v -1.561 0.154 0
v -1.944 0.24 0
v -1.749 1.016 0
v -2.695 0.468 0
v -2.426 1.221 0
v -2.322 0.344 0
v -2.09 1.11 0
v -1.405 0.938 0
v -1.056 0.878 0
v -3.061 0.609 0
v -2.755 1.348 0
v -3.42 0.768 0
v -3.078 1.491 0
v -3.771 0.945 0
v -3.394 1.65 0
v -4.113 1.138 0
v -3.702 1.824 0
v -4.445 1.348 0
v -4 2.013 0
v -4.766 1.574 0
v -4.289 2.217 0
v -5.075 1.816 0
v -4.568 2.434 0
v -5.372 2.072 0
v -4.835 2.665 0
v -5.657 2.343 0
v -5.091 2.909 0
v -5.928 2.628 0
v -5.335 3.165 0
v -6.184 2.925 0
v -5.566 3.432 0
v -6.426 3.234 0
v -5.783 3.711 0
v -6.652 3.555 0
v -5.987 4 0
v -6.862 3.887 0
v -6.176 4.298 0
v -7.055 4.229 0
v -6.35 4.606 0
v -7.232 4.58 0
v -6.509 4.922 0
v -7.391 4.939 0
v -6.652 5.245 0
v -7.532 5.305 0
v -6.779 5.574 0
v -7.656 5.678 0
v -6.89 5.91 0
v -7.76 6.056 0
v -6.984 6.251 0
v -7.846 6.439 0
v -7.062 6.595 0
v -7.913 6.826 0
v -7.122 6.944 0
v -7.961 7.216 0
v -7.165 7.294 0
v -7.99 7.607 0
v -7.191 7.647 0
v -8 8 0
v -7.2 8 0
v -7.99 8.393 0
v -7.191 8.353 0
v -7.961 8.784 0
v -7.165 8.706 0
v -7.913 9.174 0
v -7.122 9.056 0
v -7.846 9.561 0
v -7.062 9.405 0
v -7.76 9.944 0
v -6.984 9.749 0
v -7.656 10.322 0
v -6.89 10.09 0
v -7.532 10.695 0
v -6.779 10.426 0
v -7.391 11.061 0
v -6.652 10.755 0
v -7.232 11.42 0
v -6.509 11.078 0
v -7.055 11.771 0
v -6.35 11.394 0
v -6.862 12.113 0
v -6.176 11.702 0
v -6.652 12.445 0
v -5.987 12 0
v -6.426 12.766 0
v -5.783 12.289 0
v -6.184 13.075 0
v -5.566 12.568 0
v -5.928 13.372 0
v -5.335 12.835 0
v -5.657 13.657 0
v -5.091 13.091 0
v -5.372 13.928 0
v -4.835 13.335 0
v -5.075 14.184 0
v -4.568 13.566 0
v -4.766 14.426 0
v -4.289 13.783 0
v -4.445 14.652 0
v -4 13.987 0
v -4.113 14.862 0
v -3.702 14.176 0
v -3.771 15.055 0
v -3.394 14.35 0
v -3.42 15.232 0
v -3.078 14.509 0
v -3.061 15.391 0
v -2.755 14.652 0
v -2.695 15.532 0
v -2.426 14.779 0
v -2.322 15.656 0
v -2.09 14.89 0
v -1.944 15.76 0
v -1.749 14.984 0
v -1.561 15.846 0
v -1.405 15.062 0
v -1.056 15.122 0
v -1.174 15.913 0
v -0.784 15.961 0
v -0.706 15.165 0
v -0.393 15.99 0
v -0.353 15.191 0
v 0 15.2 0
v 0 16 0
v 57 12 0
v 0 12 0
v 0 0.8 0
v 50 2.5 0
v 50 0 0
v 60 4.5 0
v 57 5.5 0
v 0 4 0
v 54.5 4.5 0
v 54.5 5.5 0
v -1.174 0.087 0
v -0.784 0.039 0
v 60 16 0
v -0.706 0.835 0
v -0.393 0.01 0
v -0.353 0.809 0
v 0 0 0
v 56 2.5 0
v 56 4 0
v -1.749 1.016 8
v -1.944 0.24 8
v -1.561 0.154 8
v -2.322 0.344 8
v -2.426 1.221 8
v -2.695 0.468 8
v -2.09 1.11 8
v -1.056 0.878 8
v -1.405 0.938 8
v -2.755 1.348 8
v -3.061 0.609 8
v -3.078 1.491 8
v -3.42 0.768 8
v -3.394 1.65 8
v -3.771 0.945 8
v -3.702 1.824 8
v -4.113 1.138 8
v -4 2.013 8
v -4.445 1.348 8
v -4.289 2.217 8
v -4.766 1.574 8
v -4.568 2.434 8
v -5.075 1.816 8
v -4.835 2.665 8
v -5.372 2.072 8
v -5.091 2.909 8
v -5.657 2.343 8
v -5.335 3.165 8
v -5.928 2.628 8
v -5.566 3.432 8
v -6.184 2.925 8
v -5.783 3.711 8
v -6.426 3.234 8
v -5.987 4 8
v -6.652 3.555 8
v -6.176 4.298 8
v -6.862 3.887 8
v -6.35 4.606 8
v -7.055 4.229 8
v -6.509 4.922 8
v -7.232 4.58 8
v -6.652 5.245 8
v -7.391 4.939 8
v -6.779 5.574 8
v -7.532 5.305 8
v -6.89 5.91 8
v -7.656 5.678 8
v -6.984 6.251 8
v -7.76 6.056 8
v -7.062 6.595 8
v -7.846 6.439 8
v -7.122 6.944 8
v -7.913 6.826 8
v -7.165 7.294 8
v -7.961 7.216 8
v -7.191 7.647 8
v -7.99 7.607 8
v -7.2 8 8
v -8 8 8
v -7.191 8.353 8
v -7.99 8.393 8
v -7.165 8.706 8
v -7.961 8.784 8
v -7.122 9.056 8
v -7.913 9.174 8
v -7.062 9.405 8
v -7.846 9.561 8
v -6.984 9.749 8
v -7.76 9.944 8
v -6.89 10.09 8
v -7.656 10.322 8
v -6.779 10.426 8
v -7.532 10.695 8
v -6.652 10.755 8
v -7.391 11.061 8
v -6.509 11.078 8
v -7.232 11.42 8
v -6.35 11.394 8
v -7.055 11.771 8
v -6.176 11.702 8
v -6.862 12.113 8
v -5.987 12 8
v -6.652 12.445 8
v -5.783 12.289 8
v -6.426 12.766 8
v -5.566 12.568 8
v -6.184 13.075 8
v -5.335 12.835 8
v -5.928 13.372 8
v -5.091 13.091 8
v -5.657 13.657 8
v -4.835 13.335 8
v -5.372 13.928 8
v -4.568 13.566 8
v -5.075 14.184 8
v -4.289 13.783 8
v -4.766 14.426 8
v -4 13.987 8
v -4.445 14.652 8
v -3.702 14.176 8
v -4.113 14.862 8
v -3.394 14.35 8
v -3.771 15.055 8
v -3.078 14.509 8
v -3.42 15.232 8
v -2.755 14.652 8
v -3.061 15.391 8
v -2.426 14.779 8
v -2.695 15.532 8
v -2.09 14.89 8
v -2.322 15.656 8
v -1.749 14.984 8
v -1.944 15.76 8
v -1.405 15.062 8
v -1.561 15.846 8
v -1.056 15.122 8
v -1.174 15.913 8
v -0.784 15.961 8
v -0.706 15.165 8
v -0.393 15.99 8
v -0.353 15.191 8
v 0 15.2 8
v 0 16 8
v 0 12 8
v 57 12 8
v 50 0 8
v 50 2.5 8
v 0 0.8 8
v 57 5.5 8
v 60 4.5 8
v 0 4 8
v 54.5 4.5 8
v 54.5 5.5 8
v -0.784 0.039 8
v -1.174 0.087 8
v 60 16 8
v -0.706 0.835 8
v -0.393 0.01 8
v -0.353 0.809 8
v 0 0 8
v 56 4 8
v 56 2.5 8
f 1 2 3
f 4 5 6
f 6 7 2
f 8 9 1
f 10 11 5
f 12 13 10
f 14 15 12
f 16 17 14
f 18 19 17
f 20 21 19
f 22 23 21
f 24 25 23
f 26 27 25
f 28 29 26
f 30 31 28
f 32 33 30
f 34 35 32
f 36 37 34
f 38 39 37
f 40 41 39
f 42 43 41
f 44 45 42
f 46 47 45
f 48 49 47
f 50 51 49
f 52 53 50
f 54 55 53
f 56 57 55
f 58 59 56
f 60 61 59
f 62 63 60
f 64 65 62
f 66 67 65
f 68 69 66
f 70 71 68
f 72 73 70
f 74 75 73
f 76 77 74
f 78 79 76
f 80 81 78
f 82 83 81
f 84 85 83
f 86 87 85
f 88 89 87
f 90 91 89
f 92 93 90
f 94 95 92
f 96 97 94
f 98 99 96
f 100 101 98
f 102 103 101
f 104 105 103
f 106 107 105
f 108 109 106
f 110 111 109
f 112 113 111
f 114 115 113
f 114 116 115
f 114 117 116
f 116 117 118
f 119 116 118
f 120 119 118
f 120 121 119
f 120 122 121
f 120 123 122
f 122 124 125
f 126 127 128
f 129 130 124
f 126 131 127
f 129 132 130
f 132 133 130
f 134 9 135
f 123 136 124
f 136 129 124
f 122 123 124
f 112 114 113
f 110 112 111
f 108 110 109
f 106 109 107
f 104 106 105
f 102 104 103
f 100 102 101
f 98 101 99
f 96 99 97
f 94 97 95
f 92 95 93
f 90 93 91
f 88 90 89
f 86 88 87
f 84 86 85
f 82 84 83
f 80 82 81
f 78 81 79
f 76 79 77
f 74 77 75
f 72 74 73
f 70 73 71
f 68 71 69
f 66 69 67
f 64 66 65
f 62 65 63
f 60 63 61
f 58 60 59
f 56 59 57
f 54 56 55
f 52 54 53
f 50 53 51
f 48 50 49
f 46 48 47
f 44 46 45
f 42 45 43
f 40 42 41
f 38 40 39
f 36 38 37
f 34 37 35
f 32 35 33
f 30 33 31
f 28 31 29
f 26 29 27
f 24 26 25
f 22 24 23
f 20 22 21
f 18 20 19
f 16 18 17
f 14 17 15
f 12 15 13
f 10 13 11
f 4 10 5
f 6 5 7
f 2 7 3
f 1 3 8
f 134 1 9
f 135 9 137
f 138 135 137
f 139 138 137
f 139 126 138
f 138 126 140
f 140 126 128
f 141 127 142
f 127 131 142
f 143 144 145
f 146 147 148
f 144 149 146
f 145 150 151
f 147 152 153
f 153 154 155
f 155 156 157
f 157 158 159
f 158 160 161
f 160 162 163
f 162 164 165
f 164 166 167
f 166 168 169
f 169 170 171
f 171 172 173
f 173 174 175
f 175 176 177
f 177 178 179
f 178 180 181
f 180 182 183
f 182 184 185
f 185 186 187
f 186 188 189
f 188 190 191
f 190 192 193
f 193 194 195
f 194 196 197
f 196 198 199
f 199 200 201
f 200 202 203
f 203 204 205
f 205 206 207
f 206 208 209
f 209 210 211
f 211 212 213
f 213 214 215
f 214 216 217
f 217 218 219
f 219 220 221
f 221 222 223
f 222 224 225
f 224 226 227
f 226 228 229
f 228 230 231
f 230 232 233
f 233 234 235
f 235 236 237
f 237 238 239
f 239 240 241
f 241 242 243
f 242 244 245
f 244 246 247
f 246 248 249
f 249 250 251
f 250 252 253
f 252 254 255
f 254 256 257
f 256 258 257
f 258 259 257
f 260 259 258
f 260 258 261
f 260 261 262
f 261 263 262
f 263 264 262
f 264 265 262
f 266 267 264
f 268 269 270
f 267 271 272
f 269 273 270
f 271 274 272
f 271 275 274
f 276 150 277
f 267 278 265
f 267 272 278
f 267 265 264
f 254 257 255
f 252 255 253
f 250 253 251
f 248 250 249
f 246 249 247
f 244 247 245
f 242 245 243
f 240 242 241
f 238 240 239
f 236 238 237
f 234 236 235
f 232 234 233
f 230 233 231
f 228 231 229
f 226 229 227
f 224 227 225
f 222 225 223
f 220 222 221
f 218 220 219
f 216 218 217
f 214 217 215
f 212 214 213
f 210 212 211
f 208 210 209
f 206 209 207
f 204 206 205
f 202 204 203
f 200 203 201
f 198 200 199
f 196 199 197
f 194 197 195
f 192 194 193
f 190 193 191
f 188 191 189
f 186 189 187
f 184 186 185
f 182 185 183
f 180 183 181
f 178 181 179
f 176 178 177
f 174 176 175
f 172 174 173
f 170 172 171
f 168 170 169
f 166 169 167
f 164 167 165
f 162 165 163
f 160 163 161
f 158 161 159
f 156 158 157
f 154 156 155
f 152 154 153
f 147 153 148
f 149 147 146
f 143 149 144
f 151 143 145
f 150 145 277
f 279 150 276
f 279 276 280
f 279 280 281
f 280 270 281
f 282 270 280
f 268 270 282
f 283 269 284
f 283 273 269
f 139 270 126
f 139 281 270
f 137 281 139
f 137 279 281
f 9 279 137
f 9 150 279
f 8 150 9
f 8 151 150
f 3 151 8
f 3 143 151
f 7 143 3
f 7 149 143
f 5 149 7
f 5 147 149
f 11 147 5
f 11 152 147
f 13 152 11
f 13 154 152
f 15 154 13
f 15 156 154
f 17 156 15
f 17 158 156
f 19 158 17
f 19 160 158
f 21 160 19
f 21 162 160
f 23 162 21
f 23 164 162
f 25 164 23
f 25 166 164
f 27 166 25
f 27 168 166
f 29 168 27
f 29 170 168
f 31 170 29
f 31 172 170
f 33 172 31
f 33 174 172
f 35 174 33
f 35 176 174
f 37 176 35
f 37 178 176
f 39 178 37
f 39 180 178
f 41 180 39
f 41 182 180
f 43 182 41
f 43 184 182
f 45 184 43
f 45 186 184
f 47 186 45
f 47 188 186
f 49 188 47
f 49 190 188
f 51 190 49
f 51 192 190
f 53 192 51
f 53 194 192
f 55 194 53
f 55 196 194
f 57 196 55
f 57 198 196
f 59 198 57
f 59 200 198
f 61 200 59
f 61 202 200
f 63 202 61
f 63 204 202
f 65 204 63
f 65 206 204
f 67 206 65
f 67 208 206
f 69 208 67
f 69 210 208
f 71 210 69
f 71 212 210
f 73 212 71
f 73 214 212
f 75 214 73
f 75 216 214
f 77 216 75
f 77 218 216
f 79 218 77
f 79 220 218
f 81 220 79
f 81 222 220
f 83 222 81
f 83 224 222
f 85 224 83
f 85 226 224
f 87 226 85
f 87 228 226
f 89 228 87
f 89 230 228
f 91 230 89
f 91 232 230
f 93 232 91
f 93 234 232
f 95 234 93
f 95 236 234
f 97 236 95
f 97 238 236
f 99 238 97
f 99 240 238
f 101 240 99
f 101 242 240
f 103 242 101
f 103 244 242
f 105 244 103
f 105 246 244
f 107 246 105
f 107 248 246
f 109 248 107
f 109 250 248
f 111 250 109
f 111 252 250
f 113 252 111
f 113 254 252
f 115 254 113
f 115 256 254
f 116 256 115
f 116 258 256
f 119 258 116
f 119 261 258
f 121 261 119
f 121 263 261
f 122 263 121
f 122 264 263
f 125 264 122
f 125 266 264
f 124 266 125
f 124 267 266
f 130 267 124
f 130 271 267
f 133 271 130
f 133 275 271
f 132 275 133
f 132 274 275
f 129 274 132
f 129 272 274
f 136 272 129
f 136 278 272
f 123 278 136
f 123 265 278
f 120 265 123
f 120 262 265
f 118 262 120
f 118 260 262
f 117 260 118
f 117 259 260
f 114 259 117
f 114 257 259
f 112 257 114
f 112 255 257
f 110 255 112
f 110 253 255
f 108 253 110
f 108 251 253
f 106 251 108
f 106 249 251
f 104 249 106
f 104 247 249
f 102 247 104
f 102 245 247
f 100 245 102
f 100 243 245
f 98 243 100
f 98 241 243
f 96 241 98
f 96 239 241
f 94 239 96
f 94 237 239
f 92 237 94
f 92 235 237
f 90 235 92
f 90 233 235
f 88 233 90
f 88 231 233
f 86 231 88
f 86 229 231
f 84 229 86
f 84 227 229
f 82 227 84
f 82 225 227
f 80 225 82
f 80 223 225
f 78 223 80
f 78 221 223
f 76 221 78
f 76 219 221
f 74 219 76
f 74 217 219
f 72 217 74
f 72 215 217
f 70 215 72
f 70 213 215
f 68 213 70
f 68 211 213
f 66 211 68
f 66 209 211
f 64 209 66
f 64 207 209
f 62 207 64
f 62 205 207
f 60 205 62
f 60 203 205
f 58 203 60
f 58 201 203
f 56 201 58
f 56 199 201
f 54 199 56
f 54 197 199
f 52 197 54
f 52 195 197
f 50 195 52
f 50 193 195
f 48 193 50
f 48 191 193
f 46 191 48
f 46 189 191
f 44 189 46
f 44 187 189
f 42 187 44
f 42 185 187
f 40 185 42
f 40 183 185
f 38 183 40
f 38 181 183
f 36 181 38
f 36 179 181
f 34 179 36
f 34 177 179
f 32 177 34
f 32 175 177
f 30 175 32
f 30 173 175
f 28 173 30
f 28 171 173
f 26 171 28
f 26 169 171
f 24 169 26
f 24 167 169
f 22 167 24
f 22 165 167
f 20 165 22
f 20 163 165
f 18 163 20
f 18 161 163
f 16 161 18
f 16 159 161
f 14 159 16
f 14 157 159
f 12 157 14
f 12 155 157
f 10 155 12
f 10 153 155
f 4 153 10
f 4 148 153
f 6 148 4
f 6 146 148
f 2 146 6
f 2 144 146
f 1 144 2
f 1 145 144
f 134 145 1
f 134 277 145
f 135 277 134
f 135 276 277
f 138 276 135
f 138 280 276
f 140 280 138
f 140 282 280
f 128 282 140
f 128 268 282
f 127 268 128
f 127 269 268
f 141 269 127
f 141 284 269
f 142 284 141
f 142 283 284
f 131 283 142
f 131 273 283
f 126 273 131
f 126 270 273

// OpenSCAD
// KNOWN-WRONG PART (must fail): the pinch ridges are missing
// Pinch clamp for silicone tubing (up to 6.4 mm OD) with a living hinge and a snap latch
// Category: quick fixes. One flat profile: two jaws joined by a 0.8 mm half-ring hinge, a
// half-round pinch ridge on each jaw, and a hook on the upper jaw whose nose snaps under the
// lower jaw's thin tongue when the jaws are squeezed together.
// Print: PETG or PP (PLA hinges crack), lying flat, 0.2 mm layers, 100 % infill.
// SPDX-License-Identifier: CERN-OHL-P-2.0

/* [Clamp] */
thickness = 8;            // extrusion along Z
lower_jaw = [50, 4];      // x 0..50, y 0..4
tongue = [50, 56, 2.5];   // x from, x to, y bottom (top at y = 4)
upper_jaw = [60, 12, 16]; // x 0..60, y 12..16
hinge_c = [0, 8];         // half-ring on the x < 0 side
hinge_r = [7.2, 8];       // inner, outer radius (0.8 mm thick)
ridge_x = 27.5;
ridge_r = 1.5;
leg = [57, 60, 4.5, 12];  // hook leg x from, x to, y from, y to
nose = [54.5, 57, 4.5, 5.5];

/* [Hidden] */
eps = 0.01;

linear_extrude(thickness) union() {
    square(lower_jaw);
    translate([tongue[0], tongue[2]]) square([tongue[1] - tongue[0], lower_jaw.y - tongue[2]]);
    translate([0, upper_jaw[1]]) square([upper_jaw[0], upper_jaw[2] - upper_jaw[1]]);
    intersection() {
        translate(hinge_c) difference() { circle(r = hinge_r[1], $fn = 128); circle(r = hinge_r[0], $fn = 128); }
        translate([-hinge_r[1] - 1, -1]) square([hinge_r[1] + 1 + eps, 2 * hinge_r[1] + 2]);
    }
    translate([leg[0], leg[2]]) square([leg[1] - leg[0], leg[3] - leg[2] + eps]);
    translate([nose[0], nose[2]]) square([nose[1] - nose[0] + eps, nose[3] - nose[2]]);
}
